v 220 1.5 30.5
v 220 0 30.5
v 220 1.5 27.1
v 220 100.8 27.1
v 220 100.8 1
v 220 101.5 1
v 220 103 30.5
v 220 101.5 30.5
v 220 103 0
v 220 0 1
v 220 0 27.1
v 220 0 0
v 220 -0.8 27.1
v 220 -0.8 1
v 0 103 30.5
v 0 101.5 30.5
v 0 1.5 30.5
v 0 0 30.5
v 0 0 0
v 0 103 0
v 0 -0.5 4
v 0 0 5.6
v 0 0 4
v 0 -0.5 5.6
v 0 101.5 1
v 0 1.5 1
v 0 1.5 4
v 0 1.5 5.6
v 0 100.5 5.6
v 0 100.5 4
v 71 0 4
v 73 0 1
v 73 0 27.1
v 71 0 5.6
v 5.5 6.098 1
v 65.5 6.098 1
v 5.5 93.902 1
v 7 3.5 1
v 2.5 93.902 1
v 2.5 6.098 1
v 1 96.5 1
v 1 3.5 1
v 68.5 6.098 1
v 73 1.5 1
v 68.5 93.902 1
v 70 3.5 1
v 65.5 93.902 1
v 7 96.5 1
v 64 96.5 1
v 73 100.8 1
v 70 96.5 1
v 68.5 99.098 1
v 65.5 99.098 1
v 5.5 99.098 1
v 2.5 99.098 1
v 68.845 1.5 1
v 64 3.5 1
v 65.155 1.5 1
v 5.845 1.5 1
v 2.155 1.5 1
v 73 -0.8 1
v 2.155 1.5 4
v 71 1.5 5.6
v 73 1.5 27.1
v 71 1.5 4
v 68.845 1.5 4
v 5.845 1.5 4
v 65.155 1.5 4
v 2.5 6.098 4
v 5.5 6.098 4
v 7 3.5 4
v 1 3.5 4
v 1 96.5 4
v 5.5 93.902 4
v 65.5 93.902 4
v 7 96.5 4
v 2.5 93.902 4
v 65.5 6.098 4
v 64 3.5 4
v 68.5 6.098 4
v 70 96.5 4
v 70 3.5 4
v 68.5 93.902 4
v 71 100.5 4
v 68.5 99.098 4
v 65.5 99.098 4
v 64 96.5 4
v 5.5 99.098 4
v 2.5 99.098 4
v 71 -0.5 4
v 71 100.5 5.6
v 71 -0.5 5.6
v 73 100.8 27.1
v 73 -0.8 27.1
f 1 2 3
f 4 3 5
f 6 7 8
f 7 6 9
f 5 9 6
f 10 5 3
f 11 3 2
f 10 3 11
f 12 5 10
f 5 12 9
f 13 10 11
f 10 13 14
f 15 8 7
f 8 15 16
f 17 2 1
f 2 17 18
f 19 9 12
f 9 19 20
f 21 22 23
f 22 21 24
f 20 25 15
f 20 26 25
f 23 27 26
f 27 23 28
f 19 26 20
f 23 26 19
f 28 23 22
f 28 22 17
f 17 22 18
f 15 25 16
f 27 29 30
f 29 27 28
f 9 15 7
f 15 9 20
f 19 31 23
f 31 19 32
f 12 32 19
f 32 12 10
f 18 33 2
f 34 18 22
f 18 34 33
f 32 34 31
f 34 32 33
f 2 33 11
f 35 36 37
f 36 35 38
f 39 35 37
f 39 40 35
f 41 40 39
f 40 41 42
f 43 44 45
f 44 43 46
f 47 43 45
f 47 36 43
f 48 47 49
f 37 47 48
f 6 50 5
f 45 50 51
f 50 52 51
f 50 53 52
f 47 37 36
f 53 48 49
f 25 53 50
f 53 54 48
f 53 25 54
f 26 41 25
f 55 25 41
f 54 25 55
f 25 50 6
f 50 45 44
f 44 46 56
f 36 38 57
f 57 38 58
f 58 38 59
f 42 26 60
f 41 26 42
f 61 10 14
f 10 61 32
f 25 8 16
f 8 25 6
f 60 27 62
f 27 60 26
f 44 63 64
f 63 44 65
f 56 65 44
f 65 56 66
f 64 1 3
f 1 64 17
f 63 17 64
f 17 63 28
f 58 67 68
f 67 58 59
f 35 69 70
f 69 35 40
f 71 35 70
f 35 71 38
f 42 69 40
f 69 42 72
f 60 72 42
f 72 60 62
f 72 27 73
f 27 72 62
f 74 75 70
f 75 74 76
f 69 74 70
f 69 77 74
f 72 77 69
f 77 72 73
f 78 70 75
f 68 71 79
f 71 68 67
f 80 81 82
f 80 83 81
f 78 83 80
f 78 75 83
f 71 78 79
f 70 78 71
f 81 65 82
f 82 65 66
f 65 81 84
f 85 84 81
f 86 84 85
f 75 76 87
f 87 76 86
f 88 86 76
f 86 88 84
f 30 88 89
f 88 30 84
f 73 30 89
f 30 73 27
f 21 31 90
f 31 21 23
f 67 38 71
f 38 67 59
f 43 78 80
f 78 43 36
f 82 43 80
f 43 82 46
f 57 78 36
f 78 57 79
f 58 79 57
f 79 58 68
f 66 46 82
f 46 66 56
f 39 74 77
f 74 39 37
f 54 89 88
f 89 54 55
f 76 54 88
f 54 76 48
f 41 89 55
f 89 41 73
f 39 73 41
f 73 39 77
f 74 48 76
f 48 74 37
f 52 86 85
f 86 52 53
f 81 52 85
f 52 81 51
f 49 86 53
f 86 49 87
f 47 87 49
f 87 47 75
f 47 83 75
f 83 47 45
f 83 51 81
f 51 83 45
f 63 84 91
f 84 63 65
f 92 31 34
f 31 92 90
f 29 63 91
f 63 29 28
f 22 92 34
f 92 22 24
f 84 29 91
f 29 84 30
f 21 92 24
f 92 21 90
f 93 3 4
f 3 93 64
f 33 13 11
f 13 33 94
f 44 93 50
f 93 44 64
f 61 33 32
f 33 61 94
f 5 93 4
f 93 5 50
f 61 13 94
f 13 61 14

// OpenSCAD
// Granit — Mechanical Assembly
// Hammond 1455L2201 enclosure with PCB and 3.5" HDD side-by-side

// All dimensions in mm

// === Hammond 1455L2201 ===
case_length = 220;
case_width  = 103;
case_height = 30.5;
wall_thickness = 1.5;
belly_plate_thickness = 1.0;

// Internal dimensions
int_length = case_length;
int_width  = case_width - 2 * wall_thickness; // ~100mm
int_height = case_height - belly_plate_thickness - wall_thickness; // ~28mm usable

// === 3.5" HDD (standard) ===
hdd_length = 147;
hdd_width  = 101.6;
hdd_height = 26.1;

// === PCB ===
pcb_length = 71;
pcb_width  = 101;
pcb_thickness = 1.6;
standoff_height = 3.0;

// === Layout: side-by-side along case length ===
gap = 2; // gap between PCB and HDD

// Positions (relative to case interior origin)
pcb_x = 0;
pcb_y = (int_width - pcb_width) / 2;
pcb_z = belly_plate_thickness + standoff_height;

hdd_x = pcb_length + gap;
hdd_y = (int_width - hdd_width) / 2;
hdd_z = belly_plate_thickness; // sits flat on belly plate

// === Mounting holes ===
mount_inset = 4; // from PCB edge

// === Colors ===
case_color    = [0.75, 0.75, 0.75, 0.3]; // aluminium, transparent
pcb_color     = [0.0, 0.5, 0.0, 0.9];    // green
hdd_color     = [0.3, 0.3, 0.3, 0.9];    // dark grey
standoff_color = [0.8, 0.7, 0.0, 1.0];   // brass

// === Modules ===

module case_body() {
    color(case_color)
    difference() {
        cube([case_length, case_width, case_height]);
        // Hollow interior
        translate([0, wall_thickness, belly_plate_thickness])
            cube([int_length, int_width, int_height + wall_thickness + 1]);
    }
}

module pcb() {
    color(pcb_color)
    translate([pcb_x, pcb_y, pcb_z])
        cube([pcb_length, pcb_width, pcb_thickness]);
}

module hdd() {
    color(hdd_color)
    translate([hdd_x, hdd_y, hdd_z])
        cube([hdd_length, hdd_width, hdd_height]);
}

module standoff(x, y) {
    color(standoff_color)
    translate([pcb_x + x, pcb_y + y, belly_plate_thickness])
        cylinder(h=standoff_height, d=6, $fn=6);
}

module mounting_holes() {
    standoff(mount_inset, mount_inset);
    standoff(pcb_length - mount_inset, mount_inset);
    standoff(mount_inset, pcb_width - mount_inset);
    standoff(pcb_length - mount_inset, pcb_width - mount_inset);
}

// === Assembly ===

case_body();
pcb();
hdd();
mounting_holes();

// === Info (check clearances) ===
echo(str("PCB top surface: ", pcb_z + pcb_thickness, "mm"));
echo(str("HDD top: ", hdd_z + hdd_height, "mm"));
echo(str("Case interior ceiling: ", belly_plate_thickness + int_height, "mm"));
echo(str("PCB-to-ceiling clearance: ", belly_plate_thickness + int_height - pcb_z - pcb_thickness, "mm"));
echo(str("HDD-to-ceiling clearance: ", belly_plate_thickness + int_height - hdd_z - hdd_height, "mm"));
echo(str("Total occupied length: ", pcb_length + gap + hdd_length, "mm / ", case_length, "mm"));
